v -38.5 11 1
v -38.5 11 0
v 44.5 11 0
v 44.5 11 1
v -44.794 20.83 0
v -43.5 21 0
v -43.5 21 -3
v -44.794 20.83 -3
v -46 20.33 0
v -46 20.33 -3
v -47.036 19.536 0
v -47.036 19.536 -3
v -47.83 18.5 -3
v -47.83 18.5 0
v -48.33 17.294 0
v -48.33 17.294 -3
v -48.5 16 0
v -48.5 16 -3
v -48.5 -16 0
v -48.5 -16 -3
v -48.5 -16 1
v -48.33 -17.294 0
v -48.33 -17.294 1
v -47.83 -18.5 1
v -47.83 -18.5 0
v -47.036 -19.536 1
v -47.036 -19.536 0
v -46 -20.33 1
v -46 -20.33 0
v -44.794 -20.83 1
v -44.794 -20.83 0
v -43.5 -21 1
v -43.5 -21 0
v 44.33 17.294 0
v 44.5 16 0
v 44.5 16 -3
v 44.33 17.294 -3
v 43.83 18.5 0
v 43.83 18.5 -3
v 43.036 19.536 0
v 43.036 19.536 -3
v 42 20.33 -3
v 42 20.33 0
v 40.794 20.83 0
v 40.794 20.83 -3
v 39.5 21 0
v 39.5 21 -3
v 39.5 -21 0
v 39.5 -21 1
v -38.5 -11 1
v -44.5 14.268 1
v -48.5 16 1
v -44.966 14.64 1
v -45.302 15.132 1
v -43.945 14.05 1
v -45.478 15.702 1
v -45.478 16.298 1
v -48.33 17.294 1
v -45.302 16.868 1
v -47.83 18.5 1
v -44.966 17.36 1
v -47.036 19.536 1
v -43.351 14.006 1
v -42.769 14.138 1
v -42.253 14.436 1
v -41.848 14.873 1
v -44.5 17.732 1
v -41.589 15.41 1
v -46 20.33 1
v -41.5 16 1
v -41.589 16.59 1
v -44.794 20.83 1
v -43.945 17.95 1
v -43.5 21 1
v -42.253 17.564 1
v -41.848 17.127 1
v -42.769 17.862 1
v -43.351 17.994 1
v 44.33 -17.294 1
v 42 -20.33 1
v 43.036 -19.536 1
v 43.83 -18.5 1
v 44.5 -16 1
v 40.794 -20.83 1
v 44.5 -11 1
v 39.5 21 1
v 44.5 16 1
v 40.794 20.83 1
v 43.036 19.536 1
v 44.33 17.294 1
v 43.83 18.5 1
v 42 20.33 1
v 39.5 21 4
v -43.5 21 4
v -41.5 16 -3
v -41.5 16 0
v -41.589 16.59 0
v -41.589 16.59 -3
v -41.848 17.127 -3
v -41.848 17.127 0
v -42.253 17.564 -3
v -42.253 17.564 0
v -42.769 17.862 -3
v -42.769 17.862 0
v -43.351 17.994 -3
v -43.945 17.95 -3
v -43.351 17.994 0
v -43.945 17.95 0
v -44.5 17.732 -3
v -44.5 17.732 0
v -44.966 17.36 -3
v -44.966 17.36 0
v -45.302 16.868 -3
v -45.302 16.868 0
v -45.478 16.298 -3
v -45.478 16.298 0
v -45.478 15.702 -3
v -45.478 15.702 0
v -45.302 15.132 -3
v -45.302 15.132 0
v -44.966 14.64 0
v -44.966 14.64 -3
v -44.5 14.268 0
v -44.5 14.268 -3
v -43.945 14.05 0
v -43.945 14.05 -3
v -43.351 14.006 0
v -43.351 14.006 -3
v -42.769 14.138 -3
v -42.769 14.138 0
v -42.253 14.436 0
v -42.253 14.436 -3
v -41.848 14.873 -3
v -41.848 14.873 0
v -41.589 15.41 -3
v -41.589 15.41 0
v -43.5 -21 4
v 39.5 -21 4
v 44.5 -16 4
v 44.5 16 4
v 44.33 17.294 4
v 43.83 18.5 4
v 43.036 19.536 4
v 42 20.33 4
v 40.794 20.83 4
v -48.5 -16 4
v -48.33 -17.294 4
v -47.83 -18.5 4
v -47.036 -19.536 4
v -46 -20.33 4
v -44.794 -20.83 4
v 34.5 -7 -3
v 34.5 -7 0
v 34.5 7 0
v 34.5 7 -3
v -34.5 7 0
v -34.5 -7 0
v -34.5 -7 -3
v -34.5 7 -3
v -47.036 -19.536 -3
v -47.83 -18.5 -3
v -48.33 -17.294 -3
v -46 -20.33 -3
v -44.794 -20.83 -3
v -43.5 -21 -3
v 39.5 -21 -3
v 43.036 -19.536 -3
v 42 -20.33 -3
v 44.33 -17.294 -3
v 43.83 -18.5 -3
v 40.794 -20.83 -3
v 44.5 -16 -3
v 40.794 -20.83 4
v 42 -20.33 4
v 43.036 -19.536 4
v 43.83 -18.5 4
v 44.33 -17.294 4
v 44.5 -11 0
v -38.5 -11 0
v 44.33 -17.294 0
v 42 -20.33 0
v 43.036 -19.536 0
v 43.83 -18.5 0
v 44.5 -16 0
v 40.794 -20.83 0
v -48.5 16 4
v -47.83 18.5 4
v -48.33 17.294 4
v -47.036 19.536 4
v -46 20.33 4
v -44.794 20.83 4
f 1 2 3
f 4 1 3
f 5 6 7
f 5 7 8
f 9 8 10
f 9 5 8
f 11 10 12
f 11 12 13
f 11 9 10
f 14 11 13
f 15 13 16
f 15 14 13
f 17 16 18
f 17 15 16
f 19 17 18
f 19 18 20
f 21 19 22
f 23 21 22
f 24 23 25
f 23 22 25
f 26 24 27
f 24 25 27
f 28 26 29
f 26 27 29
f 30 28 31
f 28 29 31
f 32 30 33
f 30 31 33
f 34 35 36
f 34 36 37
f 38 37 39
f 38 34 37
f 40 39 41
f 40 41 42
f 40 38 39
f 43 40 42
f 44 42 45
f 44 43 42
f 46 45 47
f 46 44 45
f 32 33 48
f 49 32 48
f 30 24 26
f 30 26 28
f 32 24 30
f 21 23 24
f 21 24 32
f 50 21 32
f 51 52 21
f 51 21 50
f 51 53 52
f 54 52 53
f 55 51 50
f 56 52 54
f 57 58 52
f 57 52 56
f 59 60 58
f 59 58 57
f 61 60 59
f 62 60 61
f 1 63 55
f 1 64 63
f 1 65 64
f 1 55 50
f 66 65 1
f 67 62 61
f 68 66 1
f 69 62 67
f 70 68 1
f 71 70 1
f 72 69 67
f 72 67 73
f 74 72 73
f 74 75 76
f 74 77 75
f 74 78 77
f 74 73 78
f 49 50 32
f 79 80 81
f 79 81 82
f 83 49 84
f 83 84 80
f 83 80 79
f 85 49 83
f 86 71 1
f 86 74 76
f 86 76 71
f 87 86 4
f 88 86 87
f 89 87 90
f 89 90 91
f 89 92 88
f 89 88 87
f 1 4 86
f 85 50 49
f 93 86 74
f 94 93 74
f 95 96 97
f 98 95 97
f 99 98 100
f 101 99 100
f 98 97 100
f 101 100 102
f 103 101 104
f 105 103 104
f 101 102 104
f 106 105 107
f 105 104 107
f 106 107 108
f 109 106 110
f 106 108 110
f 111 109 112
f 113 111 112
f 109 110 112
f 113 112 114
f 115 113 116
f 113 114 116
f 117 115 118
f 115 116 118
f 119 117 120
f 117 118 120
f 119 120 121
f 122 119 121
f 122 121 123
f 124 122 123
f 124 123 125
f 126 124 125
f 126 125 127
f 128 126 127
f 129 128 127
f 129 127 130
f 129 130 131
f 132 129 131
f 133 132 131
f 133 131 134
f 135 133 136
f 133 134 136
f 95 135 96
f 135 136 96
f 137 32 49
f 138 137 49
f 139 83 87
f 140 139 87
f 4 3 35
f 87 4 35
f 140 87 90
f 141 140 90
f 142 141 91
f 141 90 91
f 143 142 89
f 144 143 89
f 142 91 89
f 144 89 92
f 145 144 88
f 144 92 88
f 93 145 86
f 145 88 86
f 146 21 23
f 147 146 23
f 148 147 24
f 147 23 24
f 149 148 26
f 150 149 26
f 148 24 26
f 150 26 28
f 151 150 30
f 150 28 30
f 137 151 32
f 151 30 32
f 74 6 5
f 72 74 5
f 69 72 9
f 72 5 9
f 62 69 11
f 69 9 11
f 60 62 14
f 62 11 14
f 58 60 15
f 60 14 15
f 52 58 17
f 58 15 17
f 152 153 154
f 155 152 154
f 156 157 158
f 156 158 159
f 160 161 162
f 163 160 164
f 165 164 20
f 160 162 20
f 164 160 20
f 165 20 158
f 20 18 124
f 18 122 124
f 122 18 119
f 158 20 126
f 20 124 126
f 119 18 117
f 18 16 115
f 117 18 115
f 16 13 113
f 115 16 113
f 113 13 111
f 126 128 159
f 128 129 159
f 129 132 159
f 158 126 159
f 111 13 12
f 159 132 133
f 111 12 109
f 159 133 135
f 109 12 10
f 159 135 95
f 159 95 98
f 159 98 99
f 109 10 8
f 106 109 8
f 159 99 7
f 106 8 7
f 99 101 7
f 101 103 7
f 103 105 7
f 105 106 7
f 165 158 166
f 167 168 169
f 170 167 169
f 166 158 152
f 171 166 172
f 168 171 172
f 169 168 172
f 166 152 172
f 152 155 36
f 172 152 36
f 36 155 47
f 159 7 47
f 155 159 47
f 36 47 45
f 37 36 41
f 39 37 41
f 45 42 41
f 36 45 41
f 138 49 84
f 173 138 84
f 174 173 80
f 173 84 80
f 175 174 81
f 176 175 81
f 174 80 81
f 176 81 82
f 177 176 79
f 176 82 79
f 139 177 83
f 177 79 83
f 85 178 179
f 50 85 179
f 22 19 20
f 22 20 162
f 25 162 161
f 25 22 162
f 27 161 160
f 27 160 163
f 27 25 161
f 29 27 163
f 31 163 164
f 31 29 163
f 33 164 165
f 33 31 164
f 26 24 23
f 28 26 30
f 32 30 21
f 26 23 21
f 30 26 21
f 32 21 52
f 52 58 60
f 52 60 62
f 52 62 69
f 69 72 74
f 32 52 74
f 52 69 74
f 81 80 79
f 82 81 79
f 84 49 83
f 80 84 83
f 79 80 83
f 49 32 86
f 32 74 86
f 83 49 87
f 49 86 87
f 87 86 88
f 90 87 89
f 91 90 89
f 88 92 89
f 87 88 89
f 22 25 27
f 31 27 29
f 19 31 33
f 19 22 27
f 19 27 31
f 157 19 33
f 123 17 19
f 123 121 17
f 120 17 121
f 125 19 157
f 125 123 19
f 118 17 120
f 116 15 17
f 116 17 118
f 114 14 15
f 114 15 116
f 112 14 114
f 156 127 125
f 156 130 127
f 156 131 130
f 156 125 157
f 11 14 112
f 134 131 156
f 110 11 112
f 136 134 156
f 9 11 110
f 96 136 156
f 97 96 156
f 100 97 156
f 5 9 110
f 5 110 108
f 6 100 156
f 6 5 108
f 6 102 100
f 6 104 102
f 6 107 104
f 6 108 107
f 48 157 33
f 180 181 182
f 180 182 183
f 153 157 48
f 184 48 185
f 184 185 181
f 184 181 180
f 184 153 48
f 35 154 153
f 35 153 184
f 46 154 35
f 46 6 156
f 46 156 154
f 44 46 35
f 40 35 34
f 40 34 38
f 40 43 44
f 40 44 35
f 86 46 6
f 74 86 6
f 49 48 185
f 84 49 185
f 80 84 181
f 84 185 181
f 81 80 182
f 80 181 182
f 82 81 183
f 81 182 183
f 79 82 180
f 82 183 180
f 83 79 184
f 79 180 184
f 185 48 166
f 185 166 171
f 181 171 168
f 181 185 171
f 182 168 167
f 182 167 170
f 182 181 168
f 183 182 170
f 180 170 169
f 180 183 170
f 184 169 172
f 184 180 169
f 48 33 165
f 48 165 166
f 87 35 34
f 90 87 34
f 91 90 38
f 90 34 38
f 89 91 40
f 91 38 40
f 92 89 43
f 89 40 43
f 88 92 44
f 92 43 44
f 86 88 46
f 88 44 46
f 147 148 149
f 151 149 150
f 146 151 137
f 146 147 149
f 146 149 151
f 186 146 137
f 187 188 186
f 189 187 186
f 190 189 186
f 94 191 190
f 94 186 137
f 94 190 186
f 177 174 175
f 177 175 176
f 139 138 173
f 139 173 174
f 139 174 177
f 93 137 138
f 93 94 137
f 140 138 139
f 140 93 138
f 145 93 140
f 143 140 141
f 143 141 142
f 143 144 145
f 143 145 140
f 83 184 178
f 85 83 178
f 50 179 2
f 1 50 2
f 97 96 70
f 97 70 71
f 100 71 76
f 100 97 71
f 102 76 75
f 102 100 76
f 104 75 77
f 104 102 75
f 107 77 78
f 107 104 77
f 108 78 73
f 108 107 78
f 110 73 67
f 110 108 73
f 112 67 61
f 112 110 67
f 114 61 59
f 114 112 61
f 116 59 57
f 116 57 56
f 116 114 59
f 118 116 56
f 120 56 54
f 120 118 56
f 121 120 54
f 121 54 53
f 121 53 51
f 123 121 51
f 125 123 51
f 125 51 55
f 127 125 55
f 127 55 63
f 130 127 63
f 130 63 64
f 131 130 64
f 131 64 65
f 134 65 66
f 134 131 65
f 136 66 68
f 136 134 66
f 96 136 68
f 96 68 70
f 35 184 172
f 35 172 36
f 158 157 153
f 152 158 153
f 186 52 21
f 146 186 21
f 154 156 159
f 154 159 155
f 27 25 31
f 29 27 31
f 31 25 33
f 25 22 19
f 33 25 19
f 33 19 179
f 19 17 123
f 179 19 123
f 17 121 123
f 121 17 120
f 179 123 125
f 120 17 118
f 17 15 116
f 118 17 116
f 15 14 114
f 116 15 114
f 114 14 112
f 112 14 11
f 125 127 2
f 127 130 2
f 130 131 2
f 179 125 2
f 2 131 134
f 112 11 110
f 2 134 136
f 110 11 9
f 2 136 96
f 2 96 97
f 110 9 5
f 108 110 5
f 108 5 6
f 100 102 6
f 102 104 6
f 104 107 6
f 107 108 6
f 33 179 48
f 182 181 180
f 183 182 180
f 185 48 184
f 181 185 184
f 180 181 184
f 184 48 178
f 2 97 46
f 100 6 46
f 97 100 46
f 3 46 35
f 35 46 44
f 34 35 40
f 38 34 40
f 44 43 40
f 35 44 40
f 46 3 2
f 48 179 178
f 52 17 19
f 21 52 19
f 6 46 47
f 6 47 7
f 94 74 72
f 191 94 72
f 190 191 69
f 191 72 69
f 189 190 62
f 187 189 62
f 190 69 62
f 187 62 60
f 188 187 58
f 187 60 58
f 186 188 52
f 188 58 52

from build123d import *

# Parameters (mm, degrees)
F0_R     = 2
F0_W     = 69
F0_H     = 14
F1_DEPTH = 3
F2_R     = 2
F3_DEPTH = 1
F5_DEPTH = 3


with BuildPart() as f1:
    # F0 (on Top) → F1 (new body)
    with BuildSketch(Plane.XY):
        with BuildLine():
            Line((39.5, 21), (-43.5, 21))
            ThreePointArc((-43.5, 21), (-47.035534, 19.535534), (-48.5, 16))
            Line((-48.5, 16), (-48.5, -16))
            ThreePointArc((-48.5, -16), (-47.035534, -19.535534), (-43.5, -21))
            Line((-43.5, -21), (39.5, -21))
            ThreePointArc((39.5, -21), (43.035534, -19.535534), (44.5, -16))
            Line((44.5, -16), (44.5, 16))
            ThreePointArc((44.5, 16), (43.035534, 19.535534), (39.5, 21))
        make_face()
        with Locations((-43.5, 16)):
            Circle(F0_R, mode=Mode.SUBTRACT)
        Rectangle(F0_W, F0_H, mode=Mode.SUBTRACT)
    extrude(amount=-F1_DEPTH)


with BuildPart() as f3:
    # F2 (on face) → F3 (new body)
    with BuildSketch(Plane.XY):
        with BuildLine():
            Line((-38.5, 11), (44.5, 11))
            Line((44.5, 11), (44.5, 16))
            ThreePointArc((44.5, 16), (43.035534, 19.535534), (39.5, 21))
            Line((39.5, 21), (-43.5, 21))
            ThreePointArc((-43.5, 21), (-47.035534, 19.535534), (-48.5, 16))
            Line((-48.5, 16), (-48.5, -16))
            ThreePointArc((-48.5, -16), (-47.035534, -19.535534), (-43.5, -21))
            Line((-43.5, -21), (39.5, -21))
            ThreePointArc((39.5, -21), (43.035534, -19.535534), (44.5, -16))
            Line((44.5, -16), (44.5, -11))
            Line((44.5, -11), (-38.5, -11))
            Line((-38.5, -11), (-38.5, 11))
        make_face()
        with Locations((-43.5, 16)):
            Circle(F2_R, mode=Mode.SUBTRACT)
    extrude(amount=F3_DEPTH)


with BuildPart() as f5:
    # F4 (on face) → F5 (new body)
    with BuildSketch(Plane.XY.offset(1)):
        with BuildLine():
            Line((44.5, -16), (44.5, 16))
            ThreePointArc((44.5, 16), (43.035534, 19.535534), (39.5, 21))
            Line((39.5, 21), (-43.5, 21))
            ThreePointArc((-43.5, 21), (-47.035534, 19.535534), (-48.5, 16))
            Line((-48.5, 16), (-48.5, -16))
            ThreePointArc((-48.5, -16), (-47.035534, -19.535534), (-43.5, -21))
            Line((-43.5, -21), (39.5, -21))
            ThreePointArc((39.5, -21), (43.035534, -19.535534), (44.5, -16))
        make_face()
    extrude(amount=F5_DEPTH)


solid = Compound([f1.part, f3.part, f5.part])
